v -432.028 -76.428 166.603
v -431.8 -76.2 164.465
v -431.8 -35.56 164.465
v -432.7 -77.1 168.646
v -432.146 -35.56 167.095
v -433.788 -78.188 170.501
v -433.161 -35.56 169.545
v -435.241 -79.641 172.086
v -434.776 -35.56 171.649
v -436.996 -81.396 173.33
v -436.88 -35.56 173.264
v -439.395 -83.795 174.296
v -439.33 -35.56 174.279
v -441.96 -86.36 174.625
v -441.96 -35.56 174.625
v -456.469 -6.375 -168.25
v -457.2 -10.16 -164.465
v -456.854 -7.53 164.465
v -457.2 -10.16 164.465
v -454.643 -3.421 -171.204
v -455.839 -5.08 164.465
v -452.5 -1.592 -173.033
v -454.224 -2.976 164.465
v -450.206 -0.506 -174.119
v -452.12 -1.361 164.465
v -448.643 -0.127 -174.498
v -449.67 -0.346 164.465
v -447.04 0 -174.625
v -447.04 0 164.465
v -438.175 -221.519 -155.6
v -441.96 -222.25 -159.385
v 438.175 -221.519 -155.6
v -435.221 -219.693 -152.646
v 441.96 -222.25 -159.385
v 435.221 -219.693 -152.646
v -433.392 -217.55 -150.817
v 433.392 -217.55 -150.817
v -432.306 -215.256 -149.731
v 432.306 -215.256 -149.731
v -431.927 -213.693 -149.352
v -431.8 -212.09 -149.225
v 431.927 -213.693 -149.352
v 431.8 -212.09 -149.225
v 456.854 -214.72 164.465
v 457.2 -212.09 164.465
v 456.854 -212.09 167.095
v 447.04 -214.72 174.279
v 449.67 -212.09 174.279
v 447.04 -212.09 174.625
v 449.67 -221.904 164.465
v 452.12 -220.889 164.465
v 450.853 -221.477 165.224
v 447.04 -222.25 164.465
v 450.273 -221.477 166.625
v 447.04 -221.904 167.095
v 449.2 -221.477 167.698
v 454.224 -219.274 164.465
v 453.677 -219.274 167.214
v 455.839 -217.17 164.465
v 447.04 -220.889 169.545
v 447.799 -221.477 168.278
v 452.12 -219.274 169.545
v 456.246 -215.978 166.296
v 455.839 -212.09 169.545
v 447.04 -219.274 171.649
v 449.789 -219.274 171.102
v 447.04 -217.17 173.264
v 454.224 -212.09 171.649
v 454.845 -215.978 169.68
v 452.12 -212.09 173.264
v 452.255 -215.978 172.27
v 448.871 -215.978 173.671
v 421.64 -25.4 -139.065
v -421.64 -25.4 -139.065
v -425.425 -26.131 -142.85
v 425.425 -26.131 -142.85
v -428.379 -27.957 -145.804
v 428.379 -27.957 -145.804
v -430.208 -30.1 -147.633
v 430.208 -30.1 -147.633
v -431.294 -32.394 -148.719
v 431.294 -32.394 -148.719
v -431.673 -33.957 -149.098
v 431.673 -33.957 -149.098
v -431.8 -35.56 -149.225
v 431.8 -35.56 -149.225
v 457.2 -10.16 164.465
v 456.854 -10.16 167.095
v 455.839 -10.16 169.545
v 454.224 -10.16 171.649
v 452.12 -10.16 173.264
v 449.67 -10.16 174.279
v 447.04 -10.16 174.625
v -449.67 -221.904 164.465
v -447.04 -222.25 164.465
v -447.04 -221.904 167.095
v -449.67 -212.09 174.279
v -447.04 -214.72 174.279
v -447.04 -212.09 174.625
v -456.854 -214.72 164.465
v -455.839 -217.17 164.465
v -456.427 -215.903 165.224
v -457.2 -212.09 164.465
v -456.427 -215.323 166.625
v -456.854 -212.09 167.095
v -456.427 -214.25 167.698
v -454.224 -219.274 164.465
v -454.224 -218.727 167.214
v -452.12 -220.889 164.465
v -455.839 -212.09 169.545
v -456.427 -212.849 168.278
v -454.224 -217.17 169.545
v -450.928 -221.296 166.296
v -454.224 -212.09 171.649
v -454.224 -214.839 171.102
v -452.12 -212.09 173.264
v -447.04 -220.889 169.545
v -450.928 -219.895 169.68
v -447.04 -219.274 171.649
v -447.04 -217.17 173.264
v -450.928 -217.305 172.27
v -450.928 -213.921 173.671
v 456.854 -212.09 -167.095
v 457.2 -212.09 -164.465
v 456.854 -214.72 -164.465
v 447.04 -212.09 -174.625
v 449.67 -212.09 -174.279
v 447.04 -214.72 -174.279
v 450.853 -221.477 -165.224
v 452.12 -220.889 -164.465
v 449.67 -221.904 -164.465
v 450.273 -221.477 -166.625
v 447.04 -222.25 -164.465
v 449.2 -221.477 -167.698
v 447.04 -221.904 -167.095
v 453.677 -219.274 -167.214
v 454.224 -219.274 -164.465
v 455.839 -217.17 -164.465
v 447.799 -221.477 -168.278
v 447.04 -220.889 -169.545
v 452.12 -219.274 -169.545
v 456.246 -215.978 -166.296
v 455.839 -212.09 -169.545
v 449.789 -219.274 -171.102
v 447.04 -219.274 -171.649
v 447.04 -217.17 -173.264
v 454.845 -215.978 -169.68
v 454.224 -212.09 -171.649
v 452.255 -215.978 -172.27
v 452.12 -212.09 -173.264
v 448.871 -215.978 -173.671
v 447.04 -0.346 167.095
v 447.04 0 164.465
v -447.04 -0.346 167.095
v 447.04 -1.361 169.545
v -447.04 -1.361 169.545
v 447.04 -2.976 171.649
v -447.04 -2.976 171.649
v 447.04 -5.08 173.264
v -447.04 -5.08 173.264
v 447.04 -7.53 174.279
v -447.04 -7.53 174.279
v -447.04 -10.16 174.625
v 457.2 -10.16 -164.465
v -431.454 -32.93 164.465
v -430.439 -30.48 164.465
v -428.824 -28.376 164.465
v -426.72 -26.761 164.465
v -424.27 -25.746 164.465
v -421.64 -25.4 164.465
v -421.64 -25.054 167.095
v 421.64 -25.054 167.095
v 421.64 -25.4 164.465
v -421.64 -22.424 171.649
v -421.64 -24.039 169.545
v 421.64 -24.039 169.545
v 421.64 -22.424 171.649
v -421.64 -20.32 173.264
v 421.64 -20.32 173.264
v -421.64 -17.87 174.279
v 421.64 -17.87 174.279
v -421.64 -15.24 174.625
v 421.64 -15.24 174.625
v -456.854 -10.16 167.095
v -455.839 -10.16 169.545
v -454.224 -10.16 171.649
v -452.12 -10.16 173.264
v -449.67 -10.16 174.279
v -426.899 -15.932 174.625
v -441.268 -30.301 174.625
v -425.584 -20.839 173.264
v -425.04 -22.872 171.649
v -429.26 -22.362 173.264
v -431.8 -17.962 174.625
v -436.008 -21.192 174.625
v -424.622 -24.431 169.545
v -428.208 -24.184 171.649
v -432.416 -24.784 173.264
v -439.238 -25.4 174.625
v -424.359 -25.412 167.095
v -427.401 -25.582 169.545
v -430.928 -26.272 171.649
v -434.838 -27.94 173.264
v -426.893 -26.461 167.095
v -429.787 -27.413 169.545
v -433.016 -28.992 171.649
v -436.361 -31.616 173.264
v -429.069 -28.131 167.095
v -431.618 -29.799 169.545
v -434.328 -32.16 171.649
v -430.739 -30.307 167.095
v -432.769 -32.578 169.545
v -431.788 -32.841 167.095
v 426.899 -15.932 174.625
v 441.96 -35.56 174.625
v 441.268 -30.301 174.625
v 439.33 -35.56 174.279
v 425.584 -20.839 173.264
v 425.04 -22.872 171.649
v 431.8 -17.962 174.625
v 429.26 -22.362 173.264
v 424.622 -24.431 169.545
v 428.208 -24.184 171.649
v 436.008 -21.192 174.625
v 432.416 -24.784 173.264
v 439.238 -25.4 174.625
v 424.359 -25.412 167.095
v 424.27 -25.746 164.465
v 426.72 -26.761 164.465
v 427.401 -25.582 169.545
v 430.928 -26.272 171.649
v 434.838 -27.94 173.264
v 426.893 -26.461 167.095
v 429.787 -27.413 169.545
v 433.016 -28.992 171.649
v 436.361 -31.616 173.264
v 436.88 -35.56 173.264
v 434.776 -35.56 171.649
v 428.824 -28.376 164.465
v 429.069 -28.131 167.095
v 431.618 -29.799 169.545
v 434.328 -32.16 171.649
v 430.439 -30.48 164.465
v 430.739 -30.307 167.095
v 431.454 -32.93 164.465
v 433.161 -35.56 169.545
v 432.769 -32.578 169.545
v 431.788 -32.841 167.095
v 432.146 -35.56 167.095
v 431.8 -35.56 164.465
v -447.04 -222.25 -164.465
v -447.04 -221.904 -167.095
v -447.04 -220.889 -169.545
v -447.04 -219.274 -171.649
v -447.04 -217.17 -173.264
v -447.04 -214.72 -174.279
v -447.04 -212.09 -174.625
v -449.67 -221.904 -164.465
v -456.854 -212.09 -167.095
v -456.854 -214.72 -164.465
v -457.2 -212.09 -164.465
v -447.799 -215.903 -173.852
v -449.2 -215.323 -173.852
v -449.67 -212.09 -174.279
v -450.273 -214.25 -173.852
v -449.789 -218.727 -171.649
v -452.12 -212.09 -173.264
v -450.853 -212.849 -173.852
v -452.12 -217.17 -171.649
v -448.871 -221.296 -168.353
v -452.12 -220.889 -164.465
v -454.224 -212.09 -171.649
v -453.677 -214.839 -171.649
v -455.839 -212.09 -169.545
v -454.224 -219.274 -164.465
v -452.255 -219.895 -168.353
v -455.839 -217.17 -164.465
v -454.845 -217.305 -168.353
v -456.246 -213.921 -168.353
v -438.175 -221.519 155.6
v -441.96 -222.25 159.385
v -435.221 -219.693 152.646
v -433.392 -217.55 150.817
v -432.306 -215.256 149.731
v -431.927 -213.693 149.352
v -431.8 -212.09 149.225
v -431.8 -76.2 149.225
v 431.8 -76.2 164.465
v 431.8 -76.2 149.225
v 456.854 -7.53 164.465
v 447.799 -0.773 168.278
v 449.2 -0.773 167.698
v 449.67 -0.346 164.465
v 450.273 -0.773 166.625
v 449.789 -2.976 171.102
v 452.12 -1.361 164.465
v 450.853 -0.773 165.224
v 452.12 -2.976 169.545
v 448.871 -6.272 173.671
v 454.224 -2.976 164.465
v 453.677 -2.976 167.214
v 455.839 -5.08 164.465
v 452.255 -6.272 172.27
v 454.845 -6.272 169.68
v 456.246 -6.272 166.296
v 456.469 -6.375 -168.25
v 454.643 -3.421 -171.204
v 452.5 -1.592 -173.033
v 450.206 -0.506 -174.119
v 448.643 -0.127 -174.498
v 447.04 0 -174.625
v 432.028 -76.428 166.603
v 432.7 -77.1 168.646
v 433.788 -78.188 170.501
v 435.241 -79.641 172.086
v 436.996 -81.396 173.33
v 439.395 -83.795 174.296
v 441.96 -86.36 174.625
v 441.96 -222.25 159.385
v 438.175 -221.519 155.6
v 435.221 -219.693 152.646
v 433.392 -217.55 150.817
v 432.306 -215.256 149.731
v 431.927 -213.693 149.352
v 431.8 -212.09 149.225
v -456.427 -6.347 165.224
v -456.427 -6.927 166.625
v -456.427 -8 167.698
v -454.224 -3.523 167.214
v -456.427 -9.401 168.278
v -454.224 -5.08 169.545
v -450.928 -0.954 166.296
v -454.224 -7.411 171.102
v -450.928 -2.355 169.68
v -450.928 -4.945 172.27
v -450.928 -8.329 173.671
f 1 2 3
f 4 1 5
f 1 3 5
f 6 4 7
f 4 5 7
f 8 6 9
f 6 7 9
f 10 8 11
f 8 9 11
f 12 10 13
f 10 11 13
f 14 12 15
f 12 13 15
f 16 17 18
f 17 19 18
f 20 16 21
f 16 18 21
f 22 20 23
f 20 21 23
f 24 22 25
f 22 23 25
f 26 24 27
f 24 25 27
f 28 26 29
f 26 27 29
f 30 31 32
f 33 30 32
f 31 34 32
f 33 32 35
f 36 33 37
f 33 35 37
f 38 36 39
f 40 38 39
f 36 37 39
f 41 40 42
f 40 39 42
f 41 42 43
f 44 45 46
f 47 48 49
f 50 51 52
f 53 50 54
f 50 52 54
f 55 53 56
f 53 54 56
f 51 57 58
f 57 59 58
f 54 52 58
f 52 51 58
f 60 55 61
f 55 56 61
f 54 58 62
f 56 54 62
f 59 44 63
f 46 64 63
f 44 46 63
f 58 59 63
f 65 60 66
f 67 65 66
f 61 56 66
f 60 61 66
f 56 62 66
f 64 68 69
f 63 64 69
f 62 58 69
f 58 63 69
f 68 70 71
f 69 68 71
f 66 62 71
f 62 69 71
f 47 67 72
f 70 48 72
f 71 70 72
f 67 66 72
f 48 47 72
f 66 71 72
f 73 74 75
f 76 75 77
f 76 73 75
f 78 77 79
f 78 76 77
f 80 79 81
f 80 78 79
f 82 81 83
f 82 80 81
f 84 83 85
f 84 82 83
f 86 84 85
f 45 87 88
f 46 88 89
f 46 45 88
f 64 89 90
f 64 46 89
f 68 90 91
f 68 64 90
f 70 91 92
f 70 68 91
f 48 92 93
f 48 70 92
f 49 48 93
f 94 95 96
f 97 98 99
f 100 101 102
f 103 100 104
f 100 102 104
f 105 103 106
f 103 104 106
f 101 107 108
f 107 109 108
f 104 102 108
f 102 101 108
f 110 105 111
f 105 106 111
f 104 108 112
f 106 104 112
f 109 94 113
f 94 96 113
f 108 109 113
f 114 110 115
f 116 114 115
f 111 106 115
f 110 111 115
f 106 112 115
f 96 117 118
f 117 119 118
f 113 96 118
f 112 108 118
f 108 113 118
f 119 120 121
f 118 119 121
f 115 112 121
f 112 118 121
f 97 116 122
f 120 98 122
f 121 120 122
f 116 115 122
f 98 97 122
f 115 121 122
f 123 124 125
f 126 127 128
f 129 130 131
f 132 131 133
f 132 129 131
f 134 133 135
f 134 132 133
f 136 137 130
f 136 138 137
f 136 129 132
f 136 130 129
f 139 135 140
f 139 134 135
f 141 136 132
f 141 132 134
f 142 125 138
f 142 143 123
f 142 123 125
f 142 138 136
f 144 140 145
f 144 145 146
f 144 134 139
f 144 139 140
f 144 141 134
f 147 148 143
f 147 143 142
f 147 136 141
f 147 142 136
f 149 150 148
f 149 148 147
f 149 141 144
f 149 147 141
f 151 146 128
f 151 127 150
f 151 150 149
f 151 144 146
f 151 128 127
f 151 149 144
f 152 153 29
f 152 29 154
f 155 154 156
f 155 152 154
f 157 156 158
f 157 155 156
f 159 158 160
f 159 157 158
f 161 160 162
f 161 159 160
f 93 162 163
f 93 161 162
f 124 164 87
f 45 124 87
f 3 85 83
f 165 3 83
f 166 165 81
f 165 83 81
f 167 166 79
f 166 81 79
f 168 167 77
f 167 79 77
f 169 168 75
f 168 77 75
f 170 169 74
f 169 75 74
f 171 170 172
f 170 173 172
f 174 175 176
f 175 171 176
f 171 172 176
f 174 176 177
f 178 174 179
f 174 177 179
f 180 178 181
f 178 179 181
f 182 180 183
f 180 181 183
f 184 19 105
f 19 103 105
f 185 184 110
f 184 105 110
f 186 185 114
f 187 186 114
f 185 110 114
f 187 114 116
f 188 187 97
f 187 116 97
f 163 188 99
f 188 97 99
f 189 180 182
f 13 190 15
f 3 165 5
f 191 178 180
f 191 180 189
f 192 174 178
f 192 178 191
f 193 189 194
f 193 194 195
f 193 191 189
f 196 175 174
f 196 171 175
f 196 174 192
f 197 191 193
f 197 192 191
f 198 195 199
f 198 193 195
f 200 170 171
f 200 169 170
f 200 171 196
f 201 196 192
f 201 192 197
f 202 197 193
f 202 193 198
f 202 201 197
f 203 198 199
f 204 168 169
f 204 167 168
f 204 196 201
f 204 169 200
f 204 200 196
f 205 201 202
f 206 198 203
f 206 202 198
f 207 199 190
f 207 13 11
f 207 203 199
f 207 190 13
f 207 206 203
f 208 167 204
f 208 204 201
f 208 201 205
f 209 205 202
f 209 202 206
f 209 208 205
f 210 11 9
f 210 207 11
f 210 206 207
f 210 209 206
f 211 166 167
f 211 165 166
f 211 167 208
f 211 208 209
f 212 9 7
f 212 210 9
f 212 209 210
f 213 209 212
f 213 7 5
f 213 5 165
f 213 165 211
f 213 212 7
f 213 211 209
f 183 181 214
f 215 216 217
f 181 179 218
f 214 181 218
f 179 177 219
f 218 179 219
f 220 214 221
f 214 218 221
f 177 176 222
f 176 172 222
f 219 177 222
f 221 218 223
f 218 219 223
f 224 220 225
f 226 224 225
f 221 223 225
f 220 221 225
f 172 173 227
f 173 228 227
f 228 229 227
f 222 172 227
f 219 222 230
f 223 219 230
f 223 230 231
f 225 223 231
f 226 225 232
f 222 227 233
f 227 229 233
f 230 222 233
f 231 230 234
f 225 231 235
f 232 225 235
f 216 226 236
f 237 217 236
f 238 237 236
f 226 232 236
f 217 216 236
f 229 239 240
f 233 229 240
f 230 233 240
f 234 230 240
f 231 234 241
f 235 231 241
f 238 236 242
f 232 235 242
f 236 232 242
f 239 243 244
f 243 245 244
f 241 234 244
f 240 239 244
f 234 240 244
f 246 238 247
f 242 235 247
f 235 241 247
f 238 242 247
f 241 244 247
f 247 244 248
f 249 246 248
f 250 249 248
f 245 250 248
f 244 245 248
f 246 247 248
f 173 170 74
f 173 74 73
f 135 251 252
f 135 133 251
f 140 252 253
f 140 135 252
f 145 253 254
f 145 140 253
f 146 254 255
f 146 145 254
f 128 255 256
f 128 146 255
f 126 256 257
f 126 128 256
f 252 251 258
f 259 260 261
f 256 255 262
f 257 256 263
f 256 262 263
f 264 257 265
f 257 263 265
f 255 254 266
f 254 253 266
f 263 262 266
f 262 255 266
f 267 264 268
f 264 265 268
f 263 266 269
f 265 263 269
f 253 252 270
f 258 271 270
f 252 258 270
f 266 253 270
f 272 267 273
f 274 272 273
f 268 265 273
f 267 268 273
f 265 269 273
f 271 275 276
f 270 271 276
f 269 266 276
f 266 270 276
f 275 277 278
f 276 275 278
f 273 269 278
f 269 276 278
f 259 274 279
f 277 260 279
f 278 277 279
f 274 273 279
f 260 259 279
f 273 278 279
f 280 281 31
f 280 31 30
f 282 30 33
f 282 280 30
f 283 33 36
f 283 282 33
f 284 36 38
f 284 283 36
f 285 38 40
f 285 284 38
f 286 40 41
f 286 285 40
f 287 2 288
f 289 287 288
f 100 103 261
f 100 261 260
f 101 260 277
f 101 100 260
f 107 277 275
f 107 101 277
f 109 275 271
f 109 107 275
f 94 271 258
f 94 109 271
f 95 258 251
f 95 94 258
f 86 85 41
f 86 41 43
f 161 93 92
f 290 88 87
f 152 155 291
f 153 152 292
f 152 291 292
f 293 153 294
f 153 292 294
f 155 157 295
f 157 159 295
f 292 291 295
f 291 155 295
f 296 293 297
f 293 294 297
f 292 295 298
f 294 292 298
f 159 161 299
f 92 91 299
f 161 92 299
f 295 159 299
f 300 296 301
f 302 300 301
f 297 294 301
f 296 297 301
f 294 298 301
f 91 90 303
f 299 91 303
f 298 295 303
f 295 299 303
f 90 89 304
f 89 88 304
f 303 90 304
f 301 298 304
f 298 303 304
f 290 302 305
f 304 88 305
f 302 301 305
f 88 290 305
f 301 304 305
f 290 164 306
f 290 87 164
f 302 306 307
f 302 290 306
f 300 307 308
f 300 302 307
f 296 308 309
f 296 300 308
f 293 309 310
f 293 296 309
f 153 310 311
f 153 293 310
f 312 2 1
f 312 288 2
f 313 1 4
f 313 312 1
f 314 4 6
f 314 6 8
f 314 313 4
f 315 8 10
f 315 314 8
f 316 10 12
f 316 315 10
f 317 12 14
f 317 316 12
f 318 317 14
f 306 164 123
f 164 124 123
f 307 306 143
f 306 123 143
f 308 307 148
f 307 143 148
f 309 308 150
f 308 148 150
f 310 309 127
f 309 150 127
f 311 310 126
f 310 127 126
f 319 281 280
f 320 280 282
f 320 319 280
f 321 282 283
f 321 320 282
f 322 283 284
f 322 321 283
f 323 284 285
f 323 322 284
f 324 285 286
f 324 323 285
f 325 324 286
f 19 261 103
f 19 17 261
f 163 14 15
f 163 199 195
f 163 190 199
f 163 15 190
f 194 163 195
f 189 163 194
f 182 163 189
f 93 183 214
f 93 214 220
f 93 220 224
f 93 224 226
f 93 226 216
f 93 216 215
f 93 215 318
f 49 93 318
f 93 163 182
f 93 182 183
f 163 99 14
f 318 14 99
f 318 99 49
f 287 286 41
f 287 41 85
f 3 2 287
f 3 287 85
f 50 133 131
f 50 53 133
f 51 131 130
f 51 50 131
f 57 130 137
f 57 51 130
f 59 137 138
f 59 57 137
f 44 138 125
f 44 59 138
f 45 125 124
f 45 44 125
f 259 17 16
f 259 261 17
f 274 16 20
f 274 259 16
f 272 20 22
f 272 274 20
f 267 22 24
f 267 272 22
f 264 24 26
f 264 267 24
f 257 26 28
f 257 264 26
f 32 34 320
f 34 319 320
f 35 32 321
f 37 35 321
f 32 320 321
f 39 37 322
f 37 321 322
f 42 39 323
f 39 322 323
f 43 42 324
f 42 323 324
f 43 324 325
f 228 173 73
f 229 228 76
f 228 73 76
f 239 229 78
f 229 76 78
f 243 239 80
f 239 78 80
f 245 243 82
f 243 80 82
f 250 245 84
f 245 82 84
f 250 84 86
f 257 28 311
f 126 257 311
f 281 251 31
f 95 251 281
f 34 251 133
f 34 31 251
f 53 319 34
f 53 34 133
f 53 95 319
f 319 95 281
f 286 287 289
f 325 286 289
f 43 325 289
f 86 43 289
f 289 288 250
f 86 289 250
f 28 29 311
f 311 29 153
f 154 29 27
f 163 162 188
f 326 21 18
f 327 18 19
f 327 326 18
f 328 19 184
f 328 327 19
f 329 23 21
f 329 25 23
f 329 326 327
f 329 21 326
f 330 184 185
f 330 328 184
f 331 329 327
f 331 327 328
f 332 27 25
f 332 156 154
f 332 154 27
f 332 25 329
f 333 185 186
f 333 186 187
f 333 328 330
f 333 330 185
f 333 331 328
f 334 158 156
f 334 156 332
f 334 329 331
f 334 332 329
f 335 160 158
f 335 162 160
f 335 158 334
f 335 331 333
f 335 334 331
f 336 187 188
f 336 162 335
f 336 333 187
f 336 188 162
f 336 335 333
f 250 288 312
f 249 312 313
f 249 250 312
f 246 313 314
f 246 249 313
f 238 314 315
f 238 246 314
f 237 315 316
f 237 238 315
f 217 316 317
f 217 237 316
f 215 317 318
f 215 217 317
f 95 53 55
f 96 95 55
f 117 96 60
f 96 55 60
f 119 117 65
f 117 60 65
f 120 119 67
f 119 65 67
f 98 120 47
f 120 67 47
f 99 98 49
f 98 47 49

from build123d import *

# Parameters (mm, degrees)
F0_W     = 914.4
F0_H     = 349.25
F1_DEPTH = 222.25
F2_T     = -25.4
F3_W     = 863.6
F3_H     = 50.8
F4_DEPTH = 25.4
F5_R     = 10.16


with BuildPart() as f1:
    # F0 (on Front) → F1 (new body)
    with BuildSketch(Plane.XZ):
        Rectangle(F0_W, F0_H)
    extrude(amount=F1_DEPTH)

    # F2
    f2_openings = [f1.faces().sort_by_distance(p)[0] for p in [
        (0, -222.25, 0),
    ]]
    offset(amount=F2_T, openings=f2_openings)

    # F3 (on face) → F4 (cut)
    with BuildSketch(Plane.XY.offset(174.625)):
        with Locations((0, -50.8)):
            Rectangle(F3_W, F3_H)
    extrude(amount=-F4_DEPTH, mode=Mode.SUBTRACT)

    # F5
    f5_edges = [f1.edges().sort_by_distance(p)[0] for p in [
        (457.2, -111.125, 174.625),
        (0, 0, 174.625),
        (457.2, 0, 0),
        (457.2, -111.125, -174.625),
        (457.2, -222.25, 0),
        (431.8, -25.4, 12.7),
        (0, -25.4, -149.225),
        (-431.8, -25.4, 12.7),
        (0, -25.4, 174.625),
        (0, -222.25, 174.625),
        (-457.2, -222.25, 0),
        (0, -222.25, -174.625),
        (431.8, -222.25, 0),
        (0, -222.25, -149.225),
        (-431.8, -222.25, 0),
        (0, -222.25, 149.225),
        (-457.2, 0, 0),
        (-457.2, -111.125, 174.625),
        (-457.2, -111.125, -174.625),
        (0, -76.2, 174.625),
        (-431.8, -50.8, 174.625),
        (431.8, -50.8, 174.625),
    ]]
    fillet(f5_edges, radius=F5_R)


solid = f1.part
